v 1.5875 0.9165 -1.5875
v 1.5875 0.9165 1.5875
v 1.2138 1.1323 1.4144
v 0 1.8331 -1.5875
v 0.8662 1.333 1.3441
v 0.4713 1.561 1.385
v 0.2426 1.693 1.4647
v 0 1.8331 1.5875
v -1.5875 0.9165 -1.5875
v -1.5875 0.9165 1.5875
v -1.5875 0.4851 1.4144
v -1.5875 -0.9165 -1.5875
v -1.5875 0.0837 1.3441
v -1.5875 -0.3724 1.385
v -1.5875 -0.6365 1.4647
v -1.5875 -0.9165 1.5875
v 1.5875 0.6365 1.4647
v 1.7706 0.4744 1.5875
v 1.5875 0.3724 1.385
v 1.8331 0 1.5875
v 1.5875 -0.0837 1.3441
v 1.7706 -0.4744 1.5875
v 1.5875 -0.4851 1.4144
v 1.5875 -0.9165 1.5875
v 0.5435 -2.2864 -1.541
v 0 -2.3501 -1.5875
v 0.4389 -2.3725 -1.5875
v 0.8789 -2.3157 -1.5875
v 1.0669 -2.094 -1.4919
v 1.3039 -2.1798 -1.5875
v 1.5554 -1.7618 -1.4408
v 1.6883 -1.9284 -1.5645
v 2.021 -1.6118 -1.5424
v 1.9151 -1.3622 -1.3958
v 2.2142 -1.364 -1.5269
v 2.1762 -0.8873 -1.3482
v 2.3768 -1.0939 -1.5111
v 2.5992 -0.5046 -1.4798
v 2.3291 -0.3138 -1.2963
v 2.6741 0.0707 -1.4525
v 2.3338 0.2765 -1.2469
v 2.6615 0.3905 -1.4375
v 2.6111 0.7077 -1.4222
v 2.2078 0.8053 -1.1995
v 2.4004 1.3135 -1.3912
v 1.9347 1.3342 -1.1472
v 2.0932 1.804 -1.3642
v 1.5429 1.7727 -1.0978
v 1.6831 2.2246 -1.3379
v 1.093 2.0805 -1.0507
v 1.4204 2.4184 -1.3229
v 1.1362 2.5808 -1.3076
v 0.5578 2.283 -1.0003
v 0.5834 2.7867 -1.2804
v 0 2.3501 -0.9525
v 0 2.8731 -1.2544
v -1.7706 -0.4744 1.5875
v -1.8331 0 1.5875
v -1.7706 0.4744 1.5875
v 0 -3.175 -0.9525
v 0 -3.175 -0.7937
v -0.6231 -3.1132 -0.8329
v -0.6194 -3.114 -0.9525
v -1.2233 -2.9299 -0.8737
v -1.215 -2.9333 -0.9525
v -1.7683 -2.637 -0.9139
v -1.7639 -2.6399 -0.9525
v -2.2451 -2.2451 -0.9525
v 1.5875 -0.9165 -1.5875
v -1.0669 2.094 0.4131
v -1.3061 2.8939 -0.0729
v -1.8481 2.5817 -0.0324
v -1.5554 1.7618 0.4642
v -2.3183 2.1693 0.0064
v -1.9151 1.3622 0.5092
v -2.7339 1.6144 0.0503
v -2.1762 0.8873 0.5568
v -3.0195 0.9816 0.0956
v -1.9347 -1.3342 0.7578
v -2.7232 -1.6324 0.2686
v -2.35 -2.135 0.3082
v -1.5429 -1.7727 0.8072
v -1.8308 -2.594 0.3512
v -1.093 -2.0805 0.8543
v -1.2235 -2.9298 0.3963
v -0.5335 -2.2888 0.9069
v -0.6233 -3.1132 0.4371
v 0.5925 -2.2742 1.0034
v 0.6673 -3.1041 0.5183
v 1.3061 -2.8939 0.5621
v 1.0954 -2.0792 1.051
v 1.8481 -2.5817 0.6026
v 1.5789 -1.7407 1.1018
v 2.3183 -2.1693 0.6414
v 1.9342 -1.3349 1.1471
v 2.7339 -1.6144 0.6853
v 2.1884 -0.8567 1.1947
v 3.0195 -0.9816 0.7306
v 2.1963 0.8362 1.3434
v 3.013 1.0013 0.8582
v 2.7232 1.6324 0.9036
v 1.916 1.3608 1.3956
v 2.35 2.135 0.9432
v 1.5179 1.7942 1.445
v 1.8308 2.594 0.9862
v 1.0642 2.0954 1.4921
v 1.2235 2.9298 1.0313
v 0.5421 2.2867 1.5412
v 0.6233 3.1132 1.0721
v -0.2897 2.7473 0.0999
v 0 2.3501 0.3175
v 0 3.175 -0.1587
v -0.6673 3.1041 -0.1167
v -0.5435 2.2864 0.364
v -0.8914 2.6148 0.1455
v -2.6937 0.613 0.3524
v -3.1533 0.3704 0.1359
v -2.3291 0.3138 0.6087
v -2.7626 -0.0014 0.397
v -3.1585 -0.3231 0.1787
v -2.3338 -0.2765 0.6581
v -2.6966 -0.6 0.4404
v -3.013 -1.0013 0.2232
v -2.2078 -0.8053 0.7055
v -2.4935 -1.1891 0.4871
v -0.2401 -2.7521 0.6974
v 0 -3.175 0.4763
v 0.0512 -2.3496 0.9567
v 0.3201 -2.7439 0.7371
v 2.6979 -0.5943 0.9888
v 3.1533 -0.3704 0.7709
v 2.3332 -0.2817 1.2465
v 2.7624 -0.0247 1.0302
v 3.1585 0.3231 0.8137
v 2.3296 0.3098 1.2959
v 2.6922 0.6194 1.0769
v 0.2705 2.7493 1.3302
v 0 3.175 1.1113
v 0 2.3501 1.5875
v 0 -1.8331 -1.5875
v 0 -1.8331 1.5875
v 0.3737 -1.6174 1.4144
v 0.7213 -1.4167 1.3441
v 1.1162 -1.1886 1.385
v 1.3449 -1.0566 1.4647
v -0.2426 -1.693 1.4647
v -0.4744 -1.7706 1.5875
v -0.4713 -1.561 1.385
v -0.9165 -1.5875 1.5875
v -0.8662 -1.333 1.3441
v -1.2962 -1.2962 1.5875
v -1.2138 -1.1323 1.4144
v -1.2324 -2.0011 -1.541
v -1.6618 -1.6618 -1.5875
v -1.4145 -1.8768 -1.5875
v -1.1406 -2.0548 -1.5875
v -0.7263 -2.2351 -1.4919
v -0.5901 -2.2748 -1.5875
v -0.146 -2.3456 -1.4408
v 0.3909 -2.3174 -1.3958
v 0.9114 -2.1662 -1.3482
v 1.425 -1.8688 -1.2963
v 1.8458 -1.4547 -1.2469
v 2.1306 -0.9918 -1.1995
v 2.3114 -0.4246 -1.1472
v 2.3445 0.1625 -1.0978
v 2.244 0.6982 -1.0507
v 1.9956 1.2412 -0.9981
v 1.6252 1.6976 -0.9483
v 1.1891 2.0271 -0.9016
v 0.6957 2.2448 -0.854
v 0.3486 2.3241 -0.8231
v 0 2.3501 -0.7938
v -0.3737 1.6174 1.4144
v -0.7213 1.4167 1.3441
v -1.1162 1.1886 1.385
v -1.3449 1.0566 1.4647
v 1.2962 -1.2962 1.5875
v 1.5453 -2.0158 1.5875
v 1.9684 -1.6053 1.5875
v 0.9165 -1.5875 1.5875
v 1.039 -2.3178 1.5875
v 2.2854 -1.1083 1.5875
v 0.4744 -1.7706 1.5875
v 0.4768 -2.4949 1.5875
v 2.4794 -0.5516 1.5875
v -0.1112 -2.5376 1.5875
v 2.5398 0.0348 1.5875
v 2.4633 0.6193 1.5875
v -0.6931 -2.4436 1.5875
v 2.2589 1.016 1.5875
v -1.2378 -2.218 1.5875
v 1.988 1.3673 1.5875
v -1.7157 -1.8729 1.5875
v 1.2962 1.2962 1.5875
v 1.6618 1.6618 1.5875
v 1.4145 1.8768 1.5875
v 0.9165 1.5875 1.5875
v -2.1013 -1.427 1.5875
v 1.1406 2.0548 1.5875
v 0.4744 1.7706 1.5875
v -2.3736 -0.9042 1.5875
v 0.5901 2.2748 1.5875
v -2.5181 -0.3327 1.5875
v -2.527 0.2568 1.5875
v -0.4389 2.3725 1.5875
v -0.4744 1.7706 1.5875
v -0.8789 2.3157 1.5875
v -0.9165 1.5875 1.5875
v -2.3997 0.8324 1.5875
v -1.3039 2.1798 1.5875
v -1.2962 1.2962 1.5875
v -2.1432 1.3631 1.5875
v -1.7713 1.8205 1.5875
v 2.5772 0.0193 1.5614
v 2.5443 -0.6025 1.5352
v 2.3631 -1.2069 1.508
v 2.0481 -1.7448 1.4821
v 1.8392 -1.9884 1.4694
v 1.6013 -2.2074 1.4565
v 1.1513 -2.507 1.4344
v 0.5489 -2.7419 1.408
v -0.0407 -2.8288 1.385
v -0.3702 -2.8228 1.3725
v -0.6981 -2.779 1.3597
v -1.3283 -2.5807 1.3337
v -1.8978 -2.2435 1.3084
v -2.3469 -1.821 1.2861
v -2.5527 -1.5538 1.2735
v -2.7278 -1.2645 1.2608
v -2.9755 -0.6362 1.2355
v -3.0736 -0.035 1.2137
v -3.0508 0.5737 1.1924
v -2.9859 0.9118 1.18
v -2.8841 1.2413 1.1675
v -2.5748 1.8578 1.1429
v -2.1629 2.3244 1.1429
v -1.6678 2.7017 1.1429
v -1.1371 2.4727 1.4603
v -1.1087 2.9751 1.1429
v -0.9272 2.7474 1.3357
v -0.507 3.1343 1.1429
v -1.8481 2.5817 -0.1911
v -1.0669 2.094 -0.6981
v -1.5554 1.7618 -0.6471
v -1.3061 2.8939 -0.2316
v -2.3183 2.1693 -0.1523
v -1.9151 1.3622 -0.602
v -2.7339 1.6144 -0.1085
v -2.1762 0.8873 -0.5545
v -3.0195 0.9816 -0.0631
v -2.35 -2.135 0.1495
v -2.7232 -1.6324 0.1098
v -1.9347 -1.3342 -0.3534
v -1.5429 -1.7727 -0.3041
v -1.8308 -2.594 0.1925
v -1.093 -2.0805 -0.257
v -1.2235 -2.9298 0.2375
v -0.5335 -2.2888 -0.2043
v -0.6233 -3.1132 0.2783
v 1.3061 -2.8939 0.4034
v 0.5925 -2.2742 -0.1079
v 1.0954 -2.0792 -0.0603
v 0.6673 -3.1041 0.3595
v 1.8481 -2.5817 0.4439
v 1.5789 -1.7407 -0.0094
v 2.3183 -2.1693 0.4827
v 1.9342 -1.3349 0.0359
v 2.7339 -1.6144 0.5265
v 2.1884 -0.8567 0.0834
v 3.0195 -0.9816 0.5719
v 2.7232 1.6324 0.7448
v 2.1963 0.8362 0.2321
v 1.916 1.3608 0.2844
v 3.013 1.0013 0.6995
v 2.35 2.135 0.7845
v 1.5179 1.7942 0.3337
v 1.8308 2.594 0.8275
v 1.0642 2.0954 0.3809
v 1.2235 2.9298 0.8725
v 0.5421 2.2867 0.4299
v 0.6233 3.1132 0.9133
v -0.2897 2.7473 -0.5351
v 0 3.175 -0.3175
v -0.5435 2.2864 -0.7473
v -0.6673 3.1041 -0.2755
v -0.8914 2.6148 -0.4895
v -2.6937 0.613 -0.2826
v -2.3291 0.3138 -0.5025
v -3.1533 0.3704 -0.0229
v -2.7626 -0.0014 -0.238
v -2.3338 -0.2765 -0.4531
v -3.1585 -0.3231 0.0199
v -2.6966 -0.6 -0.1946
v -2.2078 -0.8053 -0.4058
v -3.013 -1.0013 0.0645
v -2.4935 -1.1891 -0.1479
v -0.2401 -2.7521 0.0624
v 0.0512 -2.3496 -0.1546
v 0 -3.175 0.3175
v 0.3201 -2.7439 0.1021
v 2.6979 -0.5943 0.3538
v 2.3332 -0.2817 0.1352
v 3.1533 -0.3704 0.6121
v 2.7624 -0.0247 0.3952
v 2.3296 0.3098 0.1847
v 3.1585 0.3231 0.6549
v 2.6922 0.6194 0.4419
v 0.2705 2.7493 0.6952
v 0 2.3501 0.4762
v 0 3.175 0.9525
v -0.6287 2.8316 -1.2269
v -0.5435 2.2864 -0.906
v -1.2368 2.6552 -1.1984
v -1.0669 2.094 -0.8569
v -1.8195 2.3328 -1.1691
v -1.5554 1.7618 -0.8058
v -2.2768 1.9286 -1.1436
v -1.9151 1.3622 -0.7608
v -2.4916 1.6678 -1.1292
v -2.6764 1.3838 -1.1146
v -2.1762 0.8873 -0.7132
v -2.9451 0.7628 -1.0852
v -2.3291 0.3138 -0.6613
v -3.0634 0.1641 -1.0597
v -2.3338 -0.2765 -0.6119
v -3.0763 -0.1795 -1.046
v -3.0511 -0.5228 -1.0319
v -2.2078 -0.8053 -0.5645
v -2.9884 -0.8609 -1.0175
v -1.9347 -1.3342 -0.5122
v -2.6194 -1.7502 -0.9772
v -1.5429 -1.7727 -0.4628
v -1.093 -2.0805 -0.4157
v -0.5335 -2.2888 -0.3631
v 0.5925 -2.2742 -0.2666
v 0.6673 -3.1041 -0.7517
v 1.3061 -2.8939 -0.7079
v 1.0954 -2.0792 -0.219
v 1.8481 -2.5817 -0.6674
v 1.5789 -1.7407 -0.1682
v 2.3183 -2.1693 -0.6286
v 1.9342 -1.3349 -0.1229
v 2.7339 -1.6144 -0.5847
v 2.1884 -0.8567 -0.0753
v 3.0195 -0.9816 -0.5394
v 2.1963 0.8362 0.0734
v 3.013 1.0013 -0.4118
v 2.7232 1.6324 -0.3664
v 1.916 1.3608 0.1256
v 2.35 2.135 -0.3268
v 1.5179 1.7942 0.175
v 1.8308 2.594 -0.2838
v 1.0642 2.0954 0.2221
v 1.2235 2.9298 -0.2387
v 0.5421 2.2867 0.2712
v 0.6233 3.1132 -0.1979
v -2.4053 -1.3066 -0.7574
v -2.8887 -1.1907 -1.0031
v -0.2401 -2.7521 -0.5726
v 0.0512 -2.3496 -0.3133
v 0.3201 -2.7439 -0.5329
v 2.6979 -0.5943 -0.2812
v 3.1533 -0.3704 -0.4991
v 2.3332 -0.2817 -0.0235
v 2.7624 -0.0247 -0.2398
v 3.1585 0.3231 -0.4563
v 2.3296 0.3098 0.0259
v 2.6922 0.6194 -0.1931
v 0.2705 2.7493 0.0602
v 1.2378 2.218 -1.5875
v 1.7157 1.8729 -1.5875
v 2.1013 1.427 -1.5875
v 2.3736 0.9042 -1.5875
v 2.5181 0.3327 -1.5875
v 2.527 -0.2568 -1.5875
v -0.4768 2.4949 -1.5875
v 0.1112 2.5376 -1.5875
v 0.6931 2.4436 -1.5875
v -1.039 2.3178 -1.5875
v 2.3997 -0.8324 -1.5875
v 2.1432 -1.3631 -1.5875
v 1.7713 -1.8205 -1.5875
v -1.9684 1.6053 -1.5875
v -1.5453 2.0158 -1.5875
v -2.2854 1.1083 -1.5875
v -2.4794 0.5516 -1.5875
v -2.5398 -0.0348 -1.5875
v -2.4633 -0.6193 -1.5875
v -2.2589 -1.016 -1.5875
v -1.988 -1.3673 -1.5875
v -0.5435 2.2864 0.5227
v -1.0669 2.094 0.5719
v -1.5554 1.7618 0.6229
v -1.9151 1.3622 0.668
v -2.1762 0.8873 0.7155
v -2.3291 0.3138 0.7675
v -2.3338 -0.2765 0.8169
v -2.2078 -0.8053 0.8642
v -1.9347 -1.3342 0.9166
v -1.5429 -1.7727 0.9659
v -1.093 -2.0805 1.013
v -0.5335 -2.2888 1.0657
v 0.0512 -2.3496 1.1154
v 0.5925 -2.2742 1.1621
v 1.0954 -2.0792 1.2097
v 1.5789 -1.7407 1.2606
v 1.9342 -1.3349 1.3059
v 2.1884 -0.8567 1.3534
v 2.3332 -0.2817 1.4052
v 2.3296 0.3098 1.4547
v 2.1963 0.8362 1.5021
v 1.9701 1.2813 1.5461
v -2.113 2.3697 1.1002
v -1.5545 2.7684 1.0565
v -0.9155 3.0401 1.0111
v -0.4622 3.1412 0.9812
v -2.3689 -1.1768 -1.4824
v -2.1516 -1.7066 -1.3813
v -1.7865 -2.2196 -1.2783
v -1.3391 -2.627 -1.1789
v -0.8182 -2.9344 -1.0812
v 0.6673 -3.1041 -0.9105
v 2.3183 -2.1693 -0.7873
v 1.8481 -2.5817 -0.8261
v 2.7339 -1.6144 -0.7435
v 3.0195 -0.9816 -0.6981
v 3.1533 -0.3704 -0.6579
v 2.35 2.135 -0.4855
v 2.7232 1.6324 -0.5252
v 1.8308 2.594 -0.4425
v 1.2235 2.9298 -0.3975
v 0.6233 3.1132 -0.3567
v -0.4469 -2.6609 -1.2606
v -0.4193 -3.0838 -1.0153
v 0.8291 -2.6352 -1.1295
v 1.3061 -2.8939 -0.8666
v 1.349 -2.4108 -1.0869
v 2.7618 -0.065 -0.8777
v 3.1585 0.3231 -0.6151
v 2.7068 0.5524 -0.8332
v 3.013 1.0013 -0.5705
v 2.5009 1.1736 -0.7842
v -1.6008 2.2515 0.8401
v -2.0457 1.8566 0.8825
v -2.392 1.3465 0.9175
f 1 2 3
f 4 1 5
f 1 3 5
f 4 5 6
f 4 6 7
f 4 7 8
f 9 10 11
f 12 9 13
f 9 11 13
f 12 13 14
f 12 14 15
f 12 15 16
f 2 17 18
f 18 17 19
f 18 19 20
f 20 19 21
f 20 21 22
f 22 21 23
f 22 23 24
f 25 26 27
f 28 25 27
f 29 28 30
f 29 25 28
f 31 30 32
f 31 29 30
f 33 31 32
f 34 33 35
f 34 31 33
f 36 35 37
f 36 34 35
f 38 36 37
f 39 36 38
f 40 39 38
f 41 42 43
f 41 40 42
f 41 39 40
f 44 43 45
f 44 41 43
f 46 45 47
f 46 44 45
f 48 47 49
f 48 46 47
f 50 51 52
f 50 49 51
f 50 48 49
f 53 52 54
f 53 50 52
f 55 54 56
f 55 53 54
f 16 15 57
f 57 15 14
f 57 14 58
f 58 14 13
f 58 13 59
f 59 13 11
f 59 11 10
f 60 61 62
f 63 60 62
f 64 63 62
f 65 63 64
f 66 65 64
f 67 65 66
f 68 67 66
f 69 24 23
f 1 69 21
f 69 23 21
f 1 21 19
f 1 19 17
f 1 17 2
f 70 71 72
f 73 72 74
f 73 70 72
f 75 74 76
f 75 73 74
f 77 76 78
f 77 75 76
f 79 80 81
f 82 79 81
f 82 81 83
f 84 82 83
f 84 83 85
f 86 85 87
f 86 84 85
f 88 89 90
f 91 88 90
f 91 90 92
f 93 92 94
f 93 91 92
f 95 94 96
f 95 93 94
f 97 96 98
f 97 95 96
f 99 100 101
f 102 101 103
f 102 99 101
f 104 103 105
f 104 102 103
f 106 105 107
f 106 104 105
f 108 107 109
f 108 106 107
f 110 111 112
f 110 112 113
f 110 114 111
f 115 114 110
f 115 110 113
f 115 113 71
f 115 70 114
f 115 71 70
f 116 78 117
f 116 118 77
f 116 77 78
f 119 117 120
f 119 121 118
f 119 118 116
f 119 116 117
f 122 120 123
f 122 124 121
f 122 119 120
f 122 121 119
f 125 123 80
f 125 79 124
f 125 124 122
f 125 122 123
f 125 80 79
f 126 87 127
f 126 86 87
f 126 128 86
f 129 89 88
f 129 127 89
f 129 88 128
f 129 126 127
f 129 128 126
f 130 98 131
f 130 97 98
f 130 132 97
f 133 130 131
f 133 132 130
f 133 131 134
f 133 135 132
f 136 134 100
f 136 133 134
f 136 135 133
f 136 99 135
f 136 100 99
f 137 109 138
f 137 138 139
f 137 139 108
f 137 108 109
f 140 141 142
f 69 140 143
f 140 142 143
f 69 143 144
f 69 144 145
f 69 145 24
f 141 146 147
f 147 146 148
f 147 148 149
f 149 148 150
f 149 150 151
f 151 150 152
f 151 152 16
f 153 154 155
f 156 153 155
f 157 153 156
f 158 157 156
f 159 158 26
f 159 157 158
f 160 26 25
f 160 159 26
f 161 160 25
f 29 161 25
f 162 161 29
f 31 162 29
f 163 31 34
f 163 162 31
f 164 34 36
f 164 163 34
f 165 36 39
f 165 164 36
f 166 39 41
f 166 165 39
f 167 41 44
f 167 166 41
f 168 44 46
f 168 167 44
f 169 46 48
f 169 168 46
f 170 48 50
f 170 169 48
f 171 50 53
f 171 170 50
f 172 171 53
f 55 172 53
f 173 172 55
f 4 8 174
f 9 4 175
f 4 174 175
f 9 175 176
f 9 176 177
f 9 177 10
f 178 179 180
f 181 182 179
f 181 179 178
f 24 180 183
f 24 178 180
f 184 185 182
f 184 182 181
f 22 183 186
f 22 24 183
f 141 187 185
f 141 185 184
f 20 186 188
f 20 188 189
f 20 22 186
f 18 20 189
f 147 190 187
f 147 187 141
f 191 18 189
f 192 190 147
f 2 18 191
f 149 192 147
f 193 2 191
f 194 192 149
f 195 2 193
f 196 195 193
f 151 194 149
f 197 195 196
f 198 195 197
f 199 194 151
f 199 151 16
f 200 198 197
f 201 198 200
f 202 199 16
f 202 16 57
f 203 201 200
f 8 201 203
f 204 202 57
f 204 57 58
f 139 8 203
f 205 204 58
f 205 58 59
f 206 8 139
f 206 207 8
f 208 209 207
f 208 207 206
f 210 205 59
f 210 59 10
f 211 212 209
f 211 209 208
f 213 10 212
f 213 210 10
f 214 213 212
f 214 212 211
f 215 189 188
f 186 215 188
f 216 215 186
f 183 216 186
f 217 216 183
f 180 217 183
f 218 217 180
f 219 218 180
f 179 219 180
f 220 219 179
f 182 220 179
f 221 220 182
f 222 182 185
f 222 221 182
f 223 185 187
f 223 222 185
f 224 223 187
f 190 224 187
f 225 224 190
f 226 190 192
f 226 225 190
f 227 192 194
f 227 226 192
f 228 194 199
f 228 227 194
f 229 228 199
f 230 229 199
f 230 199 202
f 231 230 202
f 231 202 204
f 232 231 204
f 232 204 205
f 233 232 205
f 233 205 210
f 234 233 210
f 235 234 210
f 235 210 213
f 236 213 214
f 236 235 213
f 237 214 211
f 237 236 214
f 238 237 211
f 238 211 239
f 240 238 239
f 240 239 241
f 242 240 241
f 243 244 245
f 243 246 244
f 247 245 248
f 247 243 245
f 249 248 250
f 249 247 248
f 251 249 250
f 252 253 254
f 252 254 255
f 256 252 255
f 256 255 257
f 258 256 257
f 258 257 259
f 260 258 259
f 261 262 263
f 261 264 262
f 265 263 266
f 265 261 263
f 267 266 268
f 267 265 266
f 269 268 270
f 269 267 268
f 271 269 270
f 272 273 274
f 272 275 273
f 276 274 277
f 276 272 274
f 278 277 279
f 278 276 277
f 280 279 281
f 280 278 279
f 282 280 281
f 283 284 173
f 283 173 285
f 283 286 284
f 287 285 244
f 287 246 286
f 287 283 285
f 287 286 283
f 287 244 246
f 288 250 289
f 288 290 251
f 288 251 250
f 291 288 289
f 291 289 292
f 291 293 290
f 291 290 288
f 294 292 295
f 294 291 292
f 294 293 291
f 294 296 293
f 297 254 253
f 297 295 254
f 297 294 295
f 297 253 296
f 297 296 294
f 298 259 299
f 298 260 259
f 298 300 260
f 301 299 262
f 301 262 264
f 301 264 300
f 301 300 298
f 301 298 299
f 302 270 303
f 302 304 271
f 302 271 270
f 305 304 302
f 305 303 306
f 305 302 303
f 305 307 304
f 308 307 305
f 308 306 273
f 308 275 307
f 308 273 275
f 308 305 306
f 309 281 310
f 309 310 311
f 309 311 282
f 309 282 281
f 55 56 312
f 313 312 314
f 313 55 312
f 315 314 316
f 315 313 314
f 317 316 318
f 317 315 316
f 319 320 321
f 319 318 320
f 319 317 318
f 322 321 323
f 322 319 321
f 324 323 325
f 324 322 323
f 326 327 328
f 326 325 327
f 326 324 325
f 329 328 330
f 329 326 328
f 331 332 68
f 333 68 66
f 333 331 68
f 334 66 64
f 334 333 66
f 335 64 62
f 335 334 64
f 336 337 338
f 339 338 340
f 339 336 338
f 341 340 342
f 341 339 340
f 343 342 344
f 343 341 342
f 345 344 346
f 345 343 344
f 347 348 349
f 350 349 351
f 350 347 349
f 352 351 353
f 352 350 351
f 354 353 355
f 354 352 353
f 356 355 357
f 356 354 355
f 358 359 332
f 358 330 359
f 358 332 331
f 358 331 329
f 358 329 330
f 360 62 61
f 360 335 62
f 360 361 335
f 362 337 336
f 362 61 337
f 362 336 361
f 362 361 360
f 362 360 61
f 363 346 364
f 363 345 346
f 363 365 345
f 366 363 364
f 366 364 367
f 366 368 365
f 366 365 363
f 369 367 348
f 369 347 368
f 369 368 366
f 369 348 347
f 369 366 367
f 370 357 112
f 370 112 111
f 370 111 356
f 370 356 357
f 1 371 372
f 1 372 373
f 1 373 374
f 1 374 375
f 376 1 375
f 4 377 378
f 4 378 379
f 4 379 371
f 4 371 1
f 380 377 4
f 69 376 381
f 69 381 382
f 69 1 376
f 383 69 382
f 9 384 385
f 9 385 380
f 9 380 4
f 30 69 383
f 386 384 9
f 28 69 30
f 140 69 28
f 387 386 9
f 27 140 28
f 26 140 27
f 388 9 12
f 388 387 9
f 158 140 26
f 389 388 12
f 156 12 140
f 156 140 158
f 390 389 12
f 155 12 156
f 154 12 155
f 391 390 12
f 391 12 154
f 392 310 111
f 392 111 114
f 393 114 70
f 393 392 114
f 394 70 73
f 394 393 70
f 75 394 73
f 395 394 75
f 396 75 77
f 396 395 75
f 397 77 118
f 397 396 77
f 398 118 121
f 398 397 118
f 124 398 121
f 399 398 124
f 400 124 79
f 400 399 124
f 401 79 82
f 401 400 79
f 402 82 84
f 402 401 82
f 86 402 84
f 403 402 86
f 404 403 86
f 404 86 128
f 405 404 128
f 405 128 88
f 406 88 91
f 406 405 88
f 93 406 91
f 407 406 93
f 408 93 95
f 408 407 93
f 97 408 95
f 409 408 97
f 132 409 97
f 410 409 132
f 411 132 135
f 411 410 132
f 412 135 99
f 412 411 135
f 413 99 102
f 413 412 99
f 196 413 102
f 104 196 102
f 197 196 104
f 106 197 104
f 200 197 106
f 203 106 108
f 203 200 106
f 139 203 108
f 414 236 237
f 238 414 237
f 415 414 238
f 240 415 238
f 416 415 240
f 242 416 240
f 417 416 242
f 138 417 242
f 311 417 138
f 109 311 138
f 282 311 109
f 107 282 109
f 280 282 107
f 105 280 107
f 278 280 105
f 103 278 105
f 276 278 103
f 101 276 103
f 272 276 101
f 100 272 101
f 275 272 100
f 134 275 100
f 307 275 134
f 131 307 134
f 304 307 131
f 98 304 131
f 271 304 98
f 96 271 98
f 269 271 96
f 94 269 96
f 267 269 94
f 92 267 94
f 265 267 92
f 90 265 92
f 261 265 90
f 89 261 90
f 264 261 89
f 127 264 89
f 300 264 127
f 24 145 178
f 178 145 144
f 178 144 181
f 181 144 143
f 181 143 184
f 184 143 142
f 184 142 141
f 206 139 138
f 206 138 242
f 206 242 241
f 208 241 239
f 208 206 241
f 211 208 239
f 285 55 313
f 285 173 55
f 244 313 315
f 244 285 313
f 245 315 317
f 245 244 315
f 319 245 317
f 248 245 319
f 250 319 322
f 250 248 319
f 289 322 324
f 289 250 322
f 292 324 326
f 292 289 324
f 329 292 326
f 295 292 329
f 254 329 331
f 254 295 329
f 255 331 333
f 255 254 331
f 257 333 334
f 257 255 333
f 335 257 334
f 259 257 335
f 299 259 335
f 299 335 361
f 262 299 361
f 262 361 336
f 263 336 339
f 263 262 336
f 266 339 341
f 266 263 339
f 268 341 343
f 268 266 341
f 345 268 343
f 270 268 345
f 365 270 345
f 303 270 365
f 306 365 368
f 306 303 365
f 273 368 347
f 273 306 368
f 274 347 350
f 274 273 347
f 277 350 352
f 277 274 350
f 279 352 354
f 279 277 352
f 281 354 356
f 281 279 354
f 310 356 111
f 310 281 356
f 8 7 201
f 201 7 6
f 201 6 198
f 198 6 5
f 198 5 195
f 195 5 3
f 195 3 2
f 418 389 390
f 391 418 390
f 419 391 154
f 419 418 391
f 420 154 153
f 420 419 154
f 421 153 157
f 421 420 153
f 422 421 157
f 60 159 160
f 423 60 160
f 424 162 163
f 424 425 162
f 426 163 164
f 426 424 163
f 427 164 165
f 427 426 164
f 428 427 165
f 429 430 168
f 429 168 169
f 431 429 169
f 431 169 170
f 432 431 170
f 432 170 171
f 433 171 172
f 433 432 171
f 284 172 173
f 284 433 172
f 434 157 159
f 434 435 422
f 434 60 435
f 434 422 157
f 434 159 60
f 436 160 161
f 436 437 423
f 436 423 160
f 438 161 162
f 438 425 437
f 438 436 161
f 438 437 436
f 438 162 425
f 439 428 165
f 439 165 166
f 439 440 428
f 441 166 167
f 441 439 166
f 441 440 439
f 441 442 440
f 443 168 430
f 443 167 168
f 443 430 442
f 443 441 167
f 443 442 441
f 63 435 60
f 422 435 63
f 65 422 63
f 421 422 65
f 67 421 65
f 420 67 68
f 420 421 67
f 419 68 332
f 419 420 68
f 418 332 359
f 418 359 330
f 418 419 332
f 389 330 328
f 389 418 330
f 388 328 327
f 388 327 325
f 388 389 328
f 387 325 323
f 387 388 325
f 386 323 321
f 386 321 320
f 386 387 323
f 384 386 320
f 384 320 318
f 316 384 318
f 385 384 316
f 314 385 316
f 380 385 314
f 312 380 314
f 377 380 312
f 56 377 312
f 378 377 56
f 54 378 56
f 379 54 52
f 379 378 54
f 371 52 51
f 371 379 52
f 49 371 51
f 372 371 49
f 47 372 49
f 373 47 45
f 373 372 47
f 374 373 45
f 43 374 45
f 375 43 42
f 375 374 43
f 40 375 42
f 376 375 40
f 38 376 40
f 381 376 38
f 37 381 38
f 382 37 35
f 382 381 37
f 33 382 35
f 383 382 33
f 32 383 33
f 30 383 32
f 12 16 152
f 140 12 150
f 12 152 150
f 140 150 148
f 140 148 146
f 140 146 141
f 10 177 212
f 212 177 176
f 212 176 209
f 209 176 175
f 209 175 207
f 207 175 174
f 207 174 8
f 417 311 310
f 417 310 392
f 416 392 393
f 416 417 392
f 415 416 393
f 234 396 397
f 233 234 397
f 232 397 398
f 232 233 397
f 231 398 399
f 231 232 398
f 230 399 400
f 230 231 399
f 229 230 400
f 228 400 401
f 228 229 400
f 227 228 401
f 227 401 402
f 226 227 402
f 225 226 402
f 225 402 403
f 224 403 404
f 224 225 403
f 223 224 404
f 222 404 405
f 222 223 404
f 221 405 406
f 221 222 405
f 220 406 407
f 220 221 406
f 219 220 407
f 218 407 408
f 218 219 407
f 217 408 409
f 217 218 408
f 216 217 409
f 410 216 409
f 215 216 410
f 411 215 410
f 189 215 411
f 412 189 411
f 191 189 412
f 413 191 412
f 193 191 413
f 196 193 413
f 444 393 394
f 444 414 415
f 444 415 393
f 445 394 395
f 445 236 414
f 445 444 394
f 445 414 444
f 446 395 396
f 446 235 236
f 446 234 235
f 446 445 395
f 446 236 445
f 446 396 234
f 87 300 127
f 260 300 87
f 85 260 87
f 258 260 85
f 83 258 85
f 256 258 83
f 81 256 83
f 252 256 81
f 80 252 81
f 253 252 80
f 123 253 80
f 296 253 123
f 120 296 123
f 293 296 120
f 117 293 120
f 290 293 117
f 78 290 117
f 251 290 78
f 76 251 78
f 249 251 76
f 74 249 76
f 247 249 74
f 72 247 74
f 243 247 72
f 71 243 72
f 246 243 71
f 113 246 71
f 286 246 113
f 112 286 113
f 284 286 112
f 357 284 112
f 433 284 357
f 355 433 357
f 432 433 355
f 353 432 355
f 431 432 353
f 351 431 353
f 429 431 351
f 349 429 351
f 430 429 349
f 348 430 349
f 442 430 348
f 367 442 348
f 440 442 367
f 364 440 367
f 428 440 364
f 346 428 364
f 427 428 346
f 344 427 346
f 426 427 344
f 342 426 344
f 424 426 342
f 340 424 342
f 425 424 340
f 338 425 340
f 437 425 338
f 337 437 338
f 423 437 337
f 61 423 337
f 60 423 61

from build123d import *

# Parameters (mm, degrees)
CUT_SWEEP2_PITCH    = 1.27
CUT_EXTRUDE10_DEPTH = 6.499261487


with BuildPart() as part:
    # Sketch22 → Revolve1 (revolve)
    with BuildSketch(Plane(origin=(0, 0, 0), x_dir=(0, 0, -1), z_dir=(1, 0, 0)), mode=Mode.PRIVATE) as revolve1_sk:
        Polygon((-1.5875, 0), (-1.5875, 2.54), (-1.142868213, 3.175), (0.9525, 3.175), (1.5875, 2.54), (1.5875, 0), (0, 0), align=None)
    revolve(revolve1_sk.sketch.rotate(Axis((0, 0, 0), (0, 0, -1)), 180), axis=Axis((0, 0, 0), (0, 0, -1)))

    # Cut-Sweep2: the profile of Sketch28 profile screwed along a right-hand helix of 3.5 turns, 8 arcs to a turn; built about Z, then put on its axis
    cut_sweep2_z = Axis((0, 0, 0), (0, 0, 1))
    cut_sweep2_corners = [(3.1753, 0, 0.000173205), (3.1753, 0, -1.111423205), (2.350110803, 0, -0.635), (2.350110803, 0, -0.47625)]
    with BuildLine(mode=Mode.PRIVATE) as cut_sweep2_profile:
        Line(cut_sweep2_corners[0], cut_sweep2_corners[1])
        Line(cut_sweep2_corners[1], cut_sweep2_corners[2])
        Line(cut_sweep2_corners[2], cut_sweep2_corners[3])
        Line(cut_sweep2_corners[3], cut_sweep2_corners[0])
    cut_sweep2_cap = Face(cut_sweep2_profile.wire())
    cut_sweep2_turn_angles = [0, 22.5, 45, 67.5, 90, 112.5, 135, 157.5, 180, 202.5, 225, 247.5, 270, 292.5, 315, 337.5, 360]
    cut_sweep2_turn_weights = [1, 0.9238795325112867, 1, 0.9238795325112867, 1, 0.9238795325112867, 1, 0.9238795325112867, 1, 0.9238795325112867, 1, 0.9238795325112867, 1, 0.9238795325112867, 1, 0.9238795325112867, 1]
    cut_sweep2_turn_rails = [Edge.make_bspline([Vector(p[0], p[1], 0).rotate(cut_sweep2_z, cut_sweep2_turn_angles[k]) / cut_sweep2_turn_weights[k] + Vector(0, 0, p[2] + CUT_SWEEP2_PITCH * cut_sweep2_turn_angles[k] / 360) for k in range(17)], [0, 0, 0, 1, 1, 2, 2, 3, 3, 4, 4, 5, 5, 6, 6, 7, 7, 8, 8, 8], 2, cut_sweep2_turn_weights) for p in cut_sweep2_corners]
    cut_sweep2_turn_sides = [Face.make_surface_from_curves(cut_sweep2_turn_rails[p[0]], cut_sweep2_turn_rails[p[1]]) for p in [(0, 1), (1, 2), (2, 3), (3, 0)]]
    cut_sweep2_last_angles = [1080, 1102.5, 1125, 1147.5, 1170, 1192.5, 1215, 1237.5, 1260]
    cut_sweep2_last_weights = [1, 0.9238795325112867, 1, 0.9238795325112867, 1, 0.9238795325112867, 1, 0.9238795325112769, 1]
    cut_sweep2_last_rails = [Edge.make_bspline([Vector(p[0], p[1], 0).rotate(cut_sweep2_z, cut_sweep2_last_angles[k]) / cut_sweep2_last_weights[k] + Vector(0, 0, p[2] + CUT_SWEEP2_PITCH * cut_sweep2_last_angles[k] / 360) for k in range(9)], [0, 0, 0, 1, 1, 2, 2, 3, 3, 4, 4, 4], 2, cut_sweep2_last_weights) for p in cut_sweep2_corners]
    cut_sweep2_last_sides = [Face.make_surface_from_curves(cut_sweep2_last_rails[p[0]], cut_sweep2_last_rails[p[1]]) for p in [(0, 1), (1, 2), (2, 3), (3, 0)]]
    cut_sweep2 = Plane(origin=(0, 0, -1.5875), x_dir=(0, 1, 0), z_dir=(0, 0, 1)) * Solid(Shell([*[p.moved(Location((0, 0, CUT_SWEEP2_PITCH * i))) for i in range(3) for p in cut_sweep2_turn_sides], *cut_sweep2_last_sides, cut_sweep2_cap, cut_sweep2_cap.rotate(cut_sweep2_z, 1260).moved(Location((0, 0, CUT_SWEEP2_PITCH * 1260 / 360)))]))
    add(cut_sweep2, mode=Mode.SUBTRACT)

    # Sketch23 → Cut-Extrude10 (cut, through all)
    with BuildSketch(Plane.XY.offset(1.5875)):
        Polygon((0, 1.833087105), (-1.5875, 0.916543552), (-1.5875, -0.916543552), (0, -1.833087105), (1.5875, -0.916543552), (1.5875, 0.916543552), align=None)
    extrude(amount=-CUT_EXTRUDE10_DEPTH, mode=Mode.SUBTRACT)

    # Cut-Extrude11 cone 1 section (through the dimple's axis) → Cut-Extrude11 (revolve, cut)
    with BuildSketch(Plane(origin=(0, 0, 1.5875), x_dir=(0, -1, 0), z_dir=(1, 0, 0))):
        Polygon((0, 0), (1.833087105, 0), (0, 1.833087105), align=None)
    revolve(axis=Axis((0, 0, 1.5875), (0, 0, -1)), mode=Mode.SUBTRACT)


solid = part.part
